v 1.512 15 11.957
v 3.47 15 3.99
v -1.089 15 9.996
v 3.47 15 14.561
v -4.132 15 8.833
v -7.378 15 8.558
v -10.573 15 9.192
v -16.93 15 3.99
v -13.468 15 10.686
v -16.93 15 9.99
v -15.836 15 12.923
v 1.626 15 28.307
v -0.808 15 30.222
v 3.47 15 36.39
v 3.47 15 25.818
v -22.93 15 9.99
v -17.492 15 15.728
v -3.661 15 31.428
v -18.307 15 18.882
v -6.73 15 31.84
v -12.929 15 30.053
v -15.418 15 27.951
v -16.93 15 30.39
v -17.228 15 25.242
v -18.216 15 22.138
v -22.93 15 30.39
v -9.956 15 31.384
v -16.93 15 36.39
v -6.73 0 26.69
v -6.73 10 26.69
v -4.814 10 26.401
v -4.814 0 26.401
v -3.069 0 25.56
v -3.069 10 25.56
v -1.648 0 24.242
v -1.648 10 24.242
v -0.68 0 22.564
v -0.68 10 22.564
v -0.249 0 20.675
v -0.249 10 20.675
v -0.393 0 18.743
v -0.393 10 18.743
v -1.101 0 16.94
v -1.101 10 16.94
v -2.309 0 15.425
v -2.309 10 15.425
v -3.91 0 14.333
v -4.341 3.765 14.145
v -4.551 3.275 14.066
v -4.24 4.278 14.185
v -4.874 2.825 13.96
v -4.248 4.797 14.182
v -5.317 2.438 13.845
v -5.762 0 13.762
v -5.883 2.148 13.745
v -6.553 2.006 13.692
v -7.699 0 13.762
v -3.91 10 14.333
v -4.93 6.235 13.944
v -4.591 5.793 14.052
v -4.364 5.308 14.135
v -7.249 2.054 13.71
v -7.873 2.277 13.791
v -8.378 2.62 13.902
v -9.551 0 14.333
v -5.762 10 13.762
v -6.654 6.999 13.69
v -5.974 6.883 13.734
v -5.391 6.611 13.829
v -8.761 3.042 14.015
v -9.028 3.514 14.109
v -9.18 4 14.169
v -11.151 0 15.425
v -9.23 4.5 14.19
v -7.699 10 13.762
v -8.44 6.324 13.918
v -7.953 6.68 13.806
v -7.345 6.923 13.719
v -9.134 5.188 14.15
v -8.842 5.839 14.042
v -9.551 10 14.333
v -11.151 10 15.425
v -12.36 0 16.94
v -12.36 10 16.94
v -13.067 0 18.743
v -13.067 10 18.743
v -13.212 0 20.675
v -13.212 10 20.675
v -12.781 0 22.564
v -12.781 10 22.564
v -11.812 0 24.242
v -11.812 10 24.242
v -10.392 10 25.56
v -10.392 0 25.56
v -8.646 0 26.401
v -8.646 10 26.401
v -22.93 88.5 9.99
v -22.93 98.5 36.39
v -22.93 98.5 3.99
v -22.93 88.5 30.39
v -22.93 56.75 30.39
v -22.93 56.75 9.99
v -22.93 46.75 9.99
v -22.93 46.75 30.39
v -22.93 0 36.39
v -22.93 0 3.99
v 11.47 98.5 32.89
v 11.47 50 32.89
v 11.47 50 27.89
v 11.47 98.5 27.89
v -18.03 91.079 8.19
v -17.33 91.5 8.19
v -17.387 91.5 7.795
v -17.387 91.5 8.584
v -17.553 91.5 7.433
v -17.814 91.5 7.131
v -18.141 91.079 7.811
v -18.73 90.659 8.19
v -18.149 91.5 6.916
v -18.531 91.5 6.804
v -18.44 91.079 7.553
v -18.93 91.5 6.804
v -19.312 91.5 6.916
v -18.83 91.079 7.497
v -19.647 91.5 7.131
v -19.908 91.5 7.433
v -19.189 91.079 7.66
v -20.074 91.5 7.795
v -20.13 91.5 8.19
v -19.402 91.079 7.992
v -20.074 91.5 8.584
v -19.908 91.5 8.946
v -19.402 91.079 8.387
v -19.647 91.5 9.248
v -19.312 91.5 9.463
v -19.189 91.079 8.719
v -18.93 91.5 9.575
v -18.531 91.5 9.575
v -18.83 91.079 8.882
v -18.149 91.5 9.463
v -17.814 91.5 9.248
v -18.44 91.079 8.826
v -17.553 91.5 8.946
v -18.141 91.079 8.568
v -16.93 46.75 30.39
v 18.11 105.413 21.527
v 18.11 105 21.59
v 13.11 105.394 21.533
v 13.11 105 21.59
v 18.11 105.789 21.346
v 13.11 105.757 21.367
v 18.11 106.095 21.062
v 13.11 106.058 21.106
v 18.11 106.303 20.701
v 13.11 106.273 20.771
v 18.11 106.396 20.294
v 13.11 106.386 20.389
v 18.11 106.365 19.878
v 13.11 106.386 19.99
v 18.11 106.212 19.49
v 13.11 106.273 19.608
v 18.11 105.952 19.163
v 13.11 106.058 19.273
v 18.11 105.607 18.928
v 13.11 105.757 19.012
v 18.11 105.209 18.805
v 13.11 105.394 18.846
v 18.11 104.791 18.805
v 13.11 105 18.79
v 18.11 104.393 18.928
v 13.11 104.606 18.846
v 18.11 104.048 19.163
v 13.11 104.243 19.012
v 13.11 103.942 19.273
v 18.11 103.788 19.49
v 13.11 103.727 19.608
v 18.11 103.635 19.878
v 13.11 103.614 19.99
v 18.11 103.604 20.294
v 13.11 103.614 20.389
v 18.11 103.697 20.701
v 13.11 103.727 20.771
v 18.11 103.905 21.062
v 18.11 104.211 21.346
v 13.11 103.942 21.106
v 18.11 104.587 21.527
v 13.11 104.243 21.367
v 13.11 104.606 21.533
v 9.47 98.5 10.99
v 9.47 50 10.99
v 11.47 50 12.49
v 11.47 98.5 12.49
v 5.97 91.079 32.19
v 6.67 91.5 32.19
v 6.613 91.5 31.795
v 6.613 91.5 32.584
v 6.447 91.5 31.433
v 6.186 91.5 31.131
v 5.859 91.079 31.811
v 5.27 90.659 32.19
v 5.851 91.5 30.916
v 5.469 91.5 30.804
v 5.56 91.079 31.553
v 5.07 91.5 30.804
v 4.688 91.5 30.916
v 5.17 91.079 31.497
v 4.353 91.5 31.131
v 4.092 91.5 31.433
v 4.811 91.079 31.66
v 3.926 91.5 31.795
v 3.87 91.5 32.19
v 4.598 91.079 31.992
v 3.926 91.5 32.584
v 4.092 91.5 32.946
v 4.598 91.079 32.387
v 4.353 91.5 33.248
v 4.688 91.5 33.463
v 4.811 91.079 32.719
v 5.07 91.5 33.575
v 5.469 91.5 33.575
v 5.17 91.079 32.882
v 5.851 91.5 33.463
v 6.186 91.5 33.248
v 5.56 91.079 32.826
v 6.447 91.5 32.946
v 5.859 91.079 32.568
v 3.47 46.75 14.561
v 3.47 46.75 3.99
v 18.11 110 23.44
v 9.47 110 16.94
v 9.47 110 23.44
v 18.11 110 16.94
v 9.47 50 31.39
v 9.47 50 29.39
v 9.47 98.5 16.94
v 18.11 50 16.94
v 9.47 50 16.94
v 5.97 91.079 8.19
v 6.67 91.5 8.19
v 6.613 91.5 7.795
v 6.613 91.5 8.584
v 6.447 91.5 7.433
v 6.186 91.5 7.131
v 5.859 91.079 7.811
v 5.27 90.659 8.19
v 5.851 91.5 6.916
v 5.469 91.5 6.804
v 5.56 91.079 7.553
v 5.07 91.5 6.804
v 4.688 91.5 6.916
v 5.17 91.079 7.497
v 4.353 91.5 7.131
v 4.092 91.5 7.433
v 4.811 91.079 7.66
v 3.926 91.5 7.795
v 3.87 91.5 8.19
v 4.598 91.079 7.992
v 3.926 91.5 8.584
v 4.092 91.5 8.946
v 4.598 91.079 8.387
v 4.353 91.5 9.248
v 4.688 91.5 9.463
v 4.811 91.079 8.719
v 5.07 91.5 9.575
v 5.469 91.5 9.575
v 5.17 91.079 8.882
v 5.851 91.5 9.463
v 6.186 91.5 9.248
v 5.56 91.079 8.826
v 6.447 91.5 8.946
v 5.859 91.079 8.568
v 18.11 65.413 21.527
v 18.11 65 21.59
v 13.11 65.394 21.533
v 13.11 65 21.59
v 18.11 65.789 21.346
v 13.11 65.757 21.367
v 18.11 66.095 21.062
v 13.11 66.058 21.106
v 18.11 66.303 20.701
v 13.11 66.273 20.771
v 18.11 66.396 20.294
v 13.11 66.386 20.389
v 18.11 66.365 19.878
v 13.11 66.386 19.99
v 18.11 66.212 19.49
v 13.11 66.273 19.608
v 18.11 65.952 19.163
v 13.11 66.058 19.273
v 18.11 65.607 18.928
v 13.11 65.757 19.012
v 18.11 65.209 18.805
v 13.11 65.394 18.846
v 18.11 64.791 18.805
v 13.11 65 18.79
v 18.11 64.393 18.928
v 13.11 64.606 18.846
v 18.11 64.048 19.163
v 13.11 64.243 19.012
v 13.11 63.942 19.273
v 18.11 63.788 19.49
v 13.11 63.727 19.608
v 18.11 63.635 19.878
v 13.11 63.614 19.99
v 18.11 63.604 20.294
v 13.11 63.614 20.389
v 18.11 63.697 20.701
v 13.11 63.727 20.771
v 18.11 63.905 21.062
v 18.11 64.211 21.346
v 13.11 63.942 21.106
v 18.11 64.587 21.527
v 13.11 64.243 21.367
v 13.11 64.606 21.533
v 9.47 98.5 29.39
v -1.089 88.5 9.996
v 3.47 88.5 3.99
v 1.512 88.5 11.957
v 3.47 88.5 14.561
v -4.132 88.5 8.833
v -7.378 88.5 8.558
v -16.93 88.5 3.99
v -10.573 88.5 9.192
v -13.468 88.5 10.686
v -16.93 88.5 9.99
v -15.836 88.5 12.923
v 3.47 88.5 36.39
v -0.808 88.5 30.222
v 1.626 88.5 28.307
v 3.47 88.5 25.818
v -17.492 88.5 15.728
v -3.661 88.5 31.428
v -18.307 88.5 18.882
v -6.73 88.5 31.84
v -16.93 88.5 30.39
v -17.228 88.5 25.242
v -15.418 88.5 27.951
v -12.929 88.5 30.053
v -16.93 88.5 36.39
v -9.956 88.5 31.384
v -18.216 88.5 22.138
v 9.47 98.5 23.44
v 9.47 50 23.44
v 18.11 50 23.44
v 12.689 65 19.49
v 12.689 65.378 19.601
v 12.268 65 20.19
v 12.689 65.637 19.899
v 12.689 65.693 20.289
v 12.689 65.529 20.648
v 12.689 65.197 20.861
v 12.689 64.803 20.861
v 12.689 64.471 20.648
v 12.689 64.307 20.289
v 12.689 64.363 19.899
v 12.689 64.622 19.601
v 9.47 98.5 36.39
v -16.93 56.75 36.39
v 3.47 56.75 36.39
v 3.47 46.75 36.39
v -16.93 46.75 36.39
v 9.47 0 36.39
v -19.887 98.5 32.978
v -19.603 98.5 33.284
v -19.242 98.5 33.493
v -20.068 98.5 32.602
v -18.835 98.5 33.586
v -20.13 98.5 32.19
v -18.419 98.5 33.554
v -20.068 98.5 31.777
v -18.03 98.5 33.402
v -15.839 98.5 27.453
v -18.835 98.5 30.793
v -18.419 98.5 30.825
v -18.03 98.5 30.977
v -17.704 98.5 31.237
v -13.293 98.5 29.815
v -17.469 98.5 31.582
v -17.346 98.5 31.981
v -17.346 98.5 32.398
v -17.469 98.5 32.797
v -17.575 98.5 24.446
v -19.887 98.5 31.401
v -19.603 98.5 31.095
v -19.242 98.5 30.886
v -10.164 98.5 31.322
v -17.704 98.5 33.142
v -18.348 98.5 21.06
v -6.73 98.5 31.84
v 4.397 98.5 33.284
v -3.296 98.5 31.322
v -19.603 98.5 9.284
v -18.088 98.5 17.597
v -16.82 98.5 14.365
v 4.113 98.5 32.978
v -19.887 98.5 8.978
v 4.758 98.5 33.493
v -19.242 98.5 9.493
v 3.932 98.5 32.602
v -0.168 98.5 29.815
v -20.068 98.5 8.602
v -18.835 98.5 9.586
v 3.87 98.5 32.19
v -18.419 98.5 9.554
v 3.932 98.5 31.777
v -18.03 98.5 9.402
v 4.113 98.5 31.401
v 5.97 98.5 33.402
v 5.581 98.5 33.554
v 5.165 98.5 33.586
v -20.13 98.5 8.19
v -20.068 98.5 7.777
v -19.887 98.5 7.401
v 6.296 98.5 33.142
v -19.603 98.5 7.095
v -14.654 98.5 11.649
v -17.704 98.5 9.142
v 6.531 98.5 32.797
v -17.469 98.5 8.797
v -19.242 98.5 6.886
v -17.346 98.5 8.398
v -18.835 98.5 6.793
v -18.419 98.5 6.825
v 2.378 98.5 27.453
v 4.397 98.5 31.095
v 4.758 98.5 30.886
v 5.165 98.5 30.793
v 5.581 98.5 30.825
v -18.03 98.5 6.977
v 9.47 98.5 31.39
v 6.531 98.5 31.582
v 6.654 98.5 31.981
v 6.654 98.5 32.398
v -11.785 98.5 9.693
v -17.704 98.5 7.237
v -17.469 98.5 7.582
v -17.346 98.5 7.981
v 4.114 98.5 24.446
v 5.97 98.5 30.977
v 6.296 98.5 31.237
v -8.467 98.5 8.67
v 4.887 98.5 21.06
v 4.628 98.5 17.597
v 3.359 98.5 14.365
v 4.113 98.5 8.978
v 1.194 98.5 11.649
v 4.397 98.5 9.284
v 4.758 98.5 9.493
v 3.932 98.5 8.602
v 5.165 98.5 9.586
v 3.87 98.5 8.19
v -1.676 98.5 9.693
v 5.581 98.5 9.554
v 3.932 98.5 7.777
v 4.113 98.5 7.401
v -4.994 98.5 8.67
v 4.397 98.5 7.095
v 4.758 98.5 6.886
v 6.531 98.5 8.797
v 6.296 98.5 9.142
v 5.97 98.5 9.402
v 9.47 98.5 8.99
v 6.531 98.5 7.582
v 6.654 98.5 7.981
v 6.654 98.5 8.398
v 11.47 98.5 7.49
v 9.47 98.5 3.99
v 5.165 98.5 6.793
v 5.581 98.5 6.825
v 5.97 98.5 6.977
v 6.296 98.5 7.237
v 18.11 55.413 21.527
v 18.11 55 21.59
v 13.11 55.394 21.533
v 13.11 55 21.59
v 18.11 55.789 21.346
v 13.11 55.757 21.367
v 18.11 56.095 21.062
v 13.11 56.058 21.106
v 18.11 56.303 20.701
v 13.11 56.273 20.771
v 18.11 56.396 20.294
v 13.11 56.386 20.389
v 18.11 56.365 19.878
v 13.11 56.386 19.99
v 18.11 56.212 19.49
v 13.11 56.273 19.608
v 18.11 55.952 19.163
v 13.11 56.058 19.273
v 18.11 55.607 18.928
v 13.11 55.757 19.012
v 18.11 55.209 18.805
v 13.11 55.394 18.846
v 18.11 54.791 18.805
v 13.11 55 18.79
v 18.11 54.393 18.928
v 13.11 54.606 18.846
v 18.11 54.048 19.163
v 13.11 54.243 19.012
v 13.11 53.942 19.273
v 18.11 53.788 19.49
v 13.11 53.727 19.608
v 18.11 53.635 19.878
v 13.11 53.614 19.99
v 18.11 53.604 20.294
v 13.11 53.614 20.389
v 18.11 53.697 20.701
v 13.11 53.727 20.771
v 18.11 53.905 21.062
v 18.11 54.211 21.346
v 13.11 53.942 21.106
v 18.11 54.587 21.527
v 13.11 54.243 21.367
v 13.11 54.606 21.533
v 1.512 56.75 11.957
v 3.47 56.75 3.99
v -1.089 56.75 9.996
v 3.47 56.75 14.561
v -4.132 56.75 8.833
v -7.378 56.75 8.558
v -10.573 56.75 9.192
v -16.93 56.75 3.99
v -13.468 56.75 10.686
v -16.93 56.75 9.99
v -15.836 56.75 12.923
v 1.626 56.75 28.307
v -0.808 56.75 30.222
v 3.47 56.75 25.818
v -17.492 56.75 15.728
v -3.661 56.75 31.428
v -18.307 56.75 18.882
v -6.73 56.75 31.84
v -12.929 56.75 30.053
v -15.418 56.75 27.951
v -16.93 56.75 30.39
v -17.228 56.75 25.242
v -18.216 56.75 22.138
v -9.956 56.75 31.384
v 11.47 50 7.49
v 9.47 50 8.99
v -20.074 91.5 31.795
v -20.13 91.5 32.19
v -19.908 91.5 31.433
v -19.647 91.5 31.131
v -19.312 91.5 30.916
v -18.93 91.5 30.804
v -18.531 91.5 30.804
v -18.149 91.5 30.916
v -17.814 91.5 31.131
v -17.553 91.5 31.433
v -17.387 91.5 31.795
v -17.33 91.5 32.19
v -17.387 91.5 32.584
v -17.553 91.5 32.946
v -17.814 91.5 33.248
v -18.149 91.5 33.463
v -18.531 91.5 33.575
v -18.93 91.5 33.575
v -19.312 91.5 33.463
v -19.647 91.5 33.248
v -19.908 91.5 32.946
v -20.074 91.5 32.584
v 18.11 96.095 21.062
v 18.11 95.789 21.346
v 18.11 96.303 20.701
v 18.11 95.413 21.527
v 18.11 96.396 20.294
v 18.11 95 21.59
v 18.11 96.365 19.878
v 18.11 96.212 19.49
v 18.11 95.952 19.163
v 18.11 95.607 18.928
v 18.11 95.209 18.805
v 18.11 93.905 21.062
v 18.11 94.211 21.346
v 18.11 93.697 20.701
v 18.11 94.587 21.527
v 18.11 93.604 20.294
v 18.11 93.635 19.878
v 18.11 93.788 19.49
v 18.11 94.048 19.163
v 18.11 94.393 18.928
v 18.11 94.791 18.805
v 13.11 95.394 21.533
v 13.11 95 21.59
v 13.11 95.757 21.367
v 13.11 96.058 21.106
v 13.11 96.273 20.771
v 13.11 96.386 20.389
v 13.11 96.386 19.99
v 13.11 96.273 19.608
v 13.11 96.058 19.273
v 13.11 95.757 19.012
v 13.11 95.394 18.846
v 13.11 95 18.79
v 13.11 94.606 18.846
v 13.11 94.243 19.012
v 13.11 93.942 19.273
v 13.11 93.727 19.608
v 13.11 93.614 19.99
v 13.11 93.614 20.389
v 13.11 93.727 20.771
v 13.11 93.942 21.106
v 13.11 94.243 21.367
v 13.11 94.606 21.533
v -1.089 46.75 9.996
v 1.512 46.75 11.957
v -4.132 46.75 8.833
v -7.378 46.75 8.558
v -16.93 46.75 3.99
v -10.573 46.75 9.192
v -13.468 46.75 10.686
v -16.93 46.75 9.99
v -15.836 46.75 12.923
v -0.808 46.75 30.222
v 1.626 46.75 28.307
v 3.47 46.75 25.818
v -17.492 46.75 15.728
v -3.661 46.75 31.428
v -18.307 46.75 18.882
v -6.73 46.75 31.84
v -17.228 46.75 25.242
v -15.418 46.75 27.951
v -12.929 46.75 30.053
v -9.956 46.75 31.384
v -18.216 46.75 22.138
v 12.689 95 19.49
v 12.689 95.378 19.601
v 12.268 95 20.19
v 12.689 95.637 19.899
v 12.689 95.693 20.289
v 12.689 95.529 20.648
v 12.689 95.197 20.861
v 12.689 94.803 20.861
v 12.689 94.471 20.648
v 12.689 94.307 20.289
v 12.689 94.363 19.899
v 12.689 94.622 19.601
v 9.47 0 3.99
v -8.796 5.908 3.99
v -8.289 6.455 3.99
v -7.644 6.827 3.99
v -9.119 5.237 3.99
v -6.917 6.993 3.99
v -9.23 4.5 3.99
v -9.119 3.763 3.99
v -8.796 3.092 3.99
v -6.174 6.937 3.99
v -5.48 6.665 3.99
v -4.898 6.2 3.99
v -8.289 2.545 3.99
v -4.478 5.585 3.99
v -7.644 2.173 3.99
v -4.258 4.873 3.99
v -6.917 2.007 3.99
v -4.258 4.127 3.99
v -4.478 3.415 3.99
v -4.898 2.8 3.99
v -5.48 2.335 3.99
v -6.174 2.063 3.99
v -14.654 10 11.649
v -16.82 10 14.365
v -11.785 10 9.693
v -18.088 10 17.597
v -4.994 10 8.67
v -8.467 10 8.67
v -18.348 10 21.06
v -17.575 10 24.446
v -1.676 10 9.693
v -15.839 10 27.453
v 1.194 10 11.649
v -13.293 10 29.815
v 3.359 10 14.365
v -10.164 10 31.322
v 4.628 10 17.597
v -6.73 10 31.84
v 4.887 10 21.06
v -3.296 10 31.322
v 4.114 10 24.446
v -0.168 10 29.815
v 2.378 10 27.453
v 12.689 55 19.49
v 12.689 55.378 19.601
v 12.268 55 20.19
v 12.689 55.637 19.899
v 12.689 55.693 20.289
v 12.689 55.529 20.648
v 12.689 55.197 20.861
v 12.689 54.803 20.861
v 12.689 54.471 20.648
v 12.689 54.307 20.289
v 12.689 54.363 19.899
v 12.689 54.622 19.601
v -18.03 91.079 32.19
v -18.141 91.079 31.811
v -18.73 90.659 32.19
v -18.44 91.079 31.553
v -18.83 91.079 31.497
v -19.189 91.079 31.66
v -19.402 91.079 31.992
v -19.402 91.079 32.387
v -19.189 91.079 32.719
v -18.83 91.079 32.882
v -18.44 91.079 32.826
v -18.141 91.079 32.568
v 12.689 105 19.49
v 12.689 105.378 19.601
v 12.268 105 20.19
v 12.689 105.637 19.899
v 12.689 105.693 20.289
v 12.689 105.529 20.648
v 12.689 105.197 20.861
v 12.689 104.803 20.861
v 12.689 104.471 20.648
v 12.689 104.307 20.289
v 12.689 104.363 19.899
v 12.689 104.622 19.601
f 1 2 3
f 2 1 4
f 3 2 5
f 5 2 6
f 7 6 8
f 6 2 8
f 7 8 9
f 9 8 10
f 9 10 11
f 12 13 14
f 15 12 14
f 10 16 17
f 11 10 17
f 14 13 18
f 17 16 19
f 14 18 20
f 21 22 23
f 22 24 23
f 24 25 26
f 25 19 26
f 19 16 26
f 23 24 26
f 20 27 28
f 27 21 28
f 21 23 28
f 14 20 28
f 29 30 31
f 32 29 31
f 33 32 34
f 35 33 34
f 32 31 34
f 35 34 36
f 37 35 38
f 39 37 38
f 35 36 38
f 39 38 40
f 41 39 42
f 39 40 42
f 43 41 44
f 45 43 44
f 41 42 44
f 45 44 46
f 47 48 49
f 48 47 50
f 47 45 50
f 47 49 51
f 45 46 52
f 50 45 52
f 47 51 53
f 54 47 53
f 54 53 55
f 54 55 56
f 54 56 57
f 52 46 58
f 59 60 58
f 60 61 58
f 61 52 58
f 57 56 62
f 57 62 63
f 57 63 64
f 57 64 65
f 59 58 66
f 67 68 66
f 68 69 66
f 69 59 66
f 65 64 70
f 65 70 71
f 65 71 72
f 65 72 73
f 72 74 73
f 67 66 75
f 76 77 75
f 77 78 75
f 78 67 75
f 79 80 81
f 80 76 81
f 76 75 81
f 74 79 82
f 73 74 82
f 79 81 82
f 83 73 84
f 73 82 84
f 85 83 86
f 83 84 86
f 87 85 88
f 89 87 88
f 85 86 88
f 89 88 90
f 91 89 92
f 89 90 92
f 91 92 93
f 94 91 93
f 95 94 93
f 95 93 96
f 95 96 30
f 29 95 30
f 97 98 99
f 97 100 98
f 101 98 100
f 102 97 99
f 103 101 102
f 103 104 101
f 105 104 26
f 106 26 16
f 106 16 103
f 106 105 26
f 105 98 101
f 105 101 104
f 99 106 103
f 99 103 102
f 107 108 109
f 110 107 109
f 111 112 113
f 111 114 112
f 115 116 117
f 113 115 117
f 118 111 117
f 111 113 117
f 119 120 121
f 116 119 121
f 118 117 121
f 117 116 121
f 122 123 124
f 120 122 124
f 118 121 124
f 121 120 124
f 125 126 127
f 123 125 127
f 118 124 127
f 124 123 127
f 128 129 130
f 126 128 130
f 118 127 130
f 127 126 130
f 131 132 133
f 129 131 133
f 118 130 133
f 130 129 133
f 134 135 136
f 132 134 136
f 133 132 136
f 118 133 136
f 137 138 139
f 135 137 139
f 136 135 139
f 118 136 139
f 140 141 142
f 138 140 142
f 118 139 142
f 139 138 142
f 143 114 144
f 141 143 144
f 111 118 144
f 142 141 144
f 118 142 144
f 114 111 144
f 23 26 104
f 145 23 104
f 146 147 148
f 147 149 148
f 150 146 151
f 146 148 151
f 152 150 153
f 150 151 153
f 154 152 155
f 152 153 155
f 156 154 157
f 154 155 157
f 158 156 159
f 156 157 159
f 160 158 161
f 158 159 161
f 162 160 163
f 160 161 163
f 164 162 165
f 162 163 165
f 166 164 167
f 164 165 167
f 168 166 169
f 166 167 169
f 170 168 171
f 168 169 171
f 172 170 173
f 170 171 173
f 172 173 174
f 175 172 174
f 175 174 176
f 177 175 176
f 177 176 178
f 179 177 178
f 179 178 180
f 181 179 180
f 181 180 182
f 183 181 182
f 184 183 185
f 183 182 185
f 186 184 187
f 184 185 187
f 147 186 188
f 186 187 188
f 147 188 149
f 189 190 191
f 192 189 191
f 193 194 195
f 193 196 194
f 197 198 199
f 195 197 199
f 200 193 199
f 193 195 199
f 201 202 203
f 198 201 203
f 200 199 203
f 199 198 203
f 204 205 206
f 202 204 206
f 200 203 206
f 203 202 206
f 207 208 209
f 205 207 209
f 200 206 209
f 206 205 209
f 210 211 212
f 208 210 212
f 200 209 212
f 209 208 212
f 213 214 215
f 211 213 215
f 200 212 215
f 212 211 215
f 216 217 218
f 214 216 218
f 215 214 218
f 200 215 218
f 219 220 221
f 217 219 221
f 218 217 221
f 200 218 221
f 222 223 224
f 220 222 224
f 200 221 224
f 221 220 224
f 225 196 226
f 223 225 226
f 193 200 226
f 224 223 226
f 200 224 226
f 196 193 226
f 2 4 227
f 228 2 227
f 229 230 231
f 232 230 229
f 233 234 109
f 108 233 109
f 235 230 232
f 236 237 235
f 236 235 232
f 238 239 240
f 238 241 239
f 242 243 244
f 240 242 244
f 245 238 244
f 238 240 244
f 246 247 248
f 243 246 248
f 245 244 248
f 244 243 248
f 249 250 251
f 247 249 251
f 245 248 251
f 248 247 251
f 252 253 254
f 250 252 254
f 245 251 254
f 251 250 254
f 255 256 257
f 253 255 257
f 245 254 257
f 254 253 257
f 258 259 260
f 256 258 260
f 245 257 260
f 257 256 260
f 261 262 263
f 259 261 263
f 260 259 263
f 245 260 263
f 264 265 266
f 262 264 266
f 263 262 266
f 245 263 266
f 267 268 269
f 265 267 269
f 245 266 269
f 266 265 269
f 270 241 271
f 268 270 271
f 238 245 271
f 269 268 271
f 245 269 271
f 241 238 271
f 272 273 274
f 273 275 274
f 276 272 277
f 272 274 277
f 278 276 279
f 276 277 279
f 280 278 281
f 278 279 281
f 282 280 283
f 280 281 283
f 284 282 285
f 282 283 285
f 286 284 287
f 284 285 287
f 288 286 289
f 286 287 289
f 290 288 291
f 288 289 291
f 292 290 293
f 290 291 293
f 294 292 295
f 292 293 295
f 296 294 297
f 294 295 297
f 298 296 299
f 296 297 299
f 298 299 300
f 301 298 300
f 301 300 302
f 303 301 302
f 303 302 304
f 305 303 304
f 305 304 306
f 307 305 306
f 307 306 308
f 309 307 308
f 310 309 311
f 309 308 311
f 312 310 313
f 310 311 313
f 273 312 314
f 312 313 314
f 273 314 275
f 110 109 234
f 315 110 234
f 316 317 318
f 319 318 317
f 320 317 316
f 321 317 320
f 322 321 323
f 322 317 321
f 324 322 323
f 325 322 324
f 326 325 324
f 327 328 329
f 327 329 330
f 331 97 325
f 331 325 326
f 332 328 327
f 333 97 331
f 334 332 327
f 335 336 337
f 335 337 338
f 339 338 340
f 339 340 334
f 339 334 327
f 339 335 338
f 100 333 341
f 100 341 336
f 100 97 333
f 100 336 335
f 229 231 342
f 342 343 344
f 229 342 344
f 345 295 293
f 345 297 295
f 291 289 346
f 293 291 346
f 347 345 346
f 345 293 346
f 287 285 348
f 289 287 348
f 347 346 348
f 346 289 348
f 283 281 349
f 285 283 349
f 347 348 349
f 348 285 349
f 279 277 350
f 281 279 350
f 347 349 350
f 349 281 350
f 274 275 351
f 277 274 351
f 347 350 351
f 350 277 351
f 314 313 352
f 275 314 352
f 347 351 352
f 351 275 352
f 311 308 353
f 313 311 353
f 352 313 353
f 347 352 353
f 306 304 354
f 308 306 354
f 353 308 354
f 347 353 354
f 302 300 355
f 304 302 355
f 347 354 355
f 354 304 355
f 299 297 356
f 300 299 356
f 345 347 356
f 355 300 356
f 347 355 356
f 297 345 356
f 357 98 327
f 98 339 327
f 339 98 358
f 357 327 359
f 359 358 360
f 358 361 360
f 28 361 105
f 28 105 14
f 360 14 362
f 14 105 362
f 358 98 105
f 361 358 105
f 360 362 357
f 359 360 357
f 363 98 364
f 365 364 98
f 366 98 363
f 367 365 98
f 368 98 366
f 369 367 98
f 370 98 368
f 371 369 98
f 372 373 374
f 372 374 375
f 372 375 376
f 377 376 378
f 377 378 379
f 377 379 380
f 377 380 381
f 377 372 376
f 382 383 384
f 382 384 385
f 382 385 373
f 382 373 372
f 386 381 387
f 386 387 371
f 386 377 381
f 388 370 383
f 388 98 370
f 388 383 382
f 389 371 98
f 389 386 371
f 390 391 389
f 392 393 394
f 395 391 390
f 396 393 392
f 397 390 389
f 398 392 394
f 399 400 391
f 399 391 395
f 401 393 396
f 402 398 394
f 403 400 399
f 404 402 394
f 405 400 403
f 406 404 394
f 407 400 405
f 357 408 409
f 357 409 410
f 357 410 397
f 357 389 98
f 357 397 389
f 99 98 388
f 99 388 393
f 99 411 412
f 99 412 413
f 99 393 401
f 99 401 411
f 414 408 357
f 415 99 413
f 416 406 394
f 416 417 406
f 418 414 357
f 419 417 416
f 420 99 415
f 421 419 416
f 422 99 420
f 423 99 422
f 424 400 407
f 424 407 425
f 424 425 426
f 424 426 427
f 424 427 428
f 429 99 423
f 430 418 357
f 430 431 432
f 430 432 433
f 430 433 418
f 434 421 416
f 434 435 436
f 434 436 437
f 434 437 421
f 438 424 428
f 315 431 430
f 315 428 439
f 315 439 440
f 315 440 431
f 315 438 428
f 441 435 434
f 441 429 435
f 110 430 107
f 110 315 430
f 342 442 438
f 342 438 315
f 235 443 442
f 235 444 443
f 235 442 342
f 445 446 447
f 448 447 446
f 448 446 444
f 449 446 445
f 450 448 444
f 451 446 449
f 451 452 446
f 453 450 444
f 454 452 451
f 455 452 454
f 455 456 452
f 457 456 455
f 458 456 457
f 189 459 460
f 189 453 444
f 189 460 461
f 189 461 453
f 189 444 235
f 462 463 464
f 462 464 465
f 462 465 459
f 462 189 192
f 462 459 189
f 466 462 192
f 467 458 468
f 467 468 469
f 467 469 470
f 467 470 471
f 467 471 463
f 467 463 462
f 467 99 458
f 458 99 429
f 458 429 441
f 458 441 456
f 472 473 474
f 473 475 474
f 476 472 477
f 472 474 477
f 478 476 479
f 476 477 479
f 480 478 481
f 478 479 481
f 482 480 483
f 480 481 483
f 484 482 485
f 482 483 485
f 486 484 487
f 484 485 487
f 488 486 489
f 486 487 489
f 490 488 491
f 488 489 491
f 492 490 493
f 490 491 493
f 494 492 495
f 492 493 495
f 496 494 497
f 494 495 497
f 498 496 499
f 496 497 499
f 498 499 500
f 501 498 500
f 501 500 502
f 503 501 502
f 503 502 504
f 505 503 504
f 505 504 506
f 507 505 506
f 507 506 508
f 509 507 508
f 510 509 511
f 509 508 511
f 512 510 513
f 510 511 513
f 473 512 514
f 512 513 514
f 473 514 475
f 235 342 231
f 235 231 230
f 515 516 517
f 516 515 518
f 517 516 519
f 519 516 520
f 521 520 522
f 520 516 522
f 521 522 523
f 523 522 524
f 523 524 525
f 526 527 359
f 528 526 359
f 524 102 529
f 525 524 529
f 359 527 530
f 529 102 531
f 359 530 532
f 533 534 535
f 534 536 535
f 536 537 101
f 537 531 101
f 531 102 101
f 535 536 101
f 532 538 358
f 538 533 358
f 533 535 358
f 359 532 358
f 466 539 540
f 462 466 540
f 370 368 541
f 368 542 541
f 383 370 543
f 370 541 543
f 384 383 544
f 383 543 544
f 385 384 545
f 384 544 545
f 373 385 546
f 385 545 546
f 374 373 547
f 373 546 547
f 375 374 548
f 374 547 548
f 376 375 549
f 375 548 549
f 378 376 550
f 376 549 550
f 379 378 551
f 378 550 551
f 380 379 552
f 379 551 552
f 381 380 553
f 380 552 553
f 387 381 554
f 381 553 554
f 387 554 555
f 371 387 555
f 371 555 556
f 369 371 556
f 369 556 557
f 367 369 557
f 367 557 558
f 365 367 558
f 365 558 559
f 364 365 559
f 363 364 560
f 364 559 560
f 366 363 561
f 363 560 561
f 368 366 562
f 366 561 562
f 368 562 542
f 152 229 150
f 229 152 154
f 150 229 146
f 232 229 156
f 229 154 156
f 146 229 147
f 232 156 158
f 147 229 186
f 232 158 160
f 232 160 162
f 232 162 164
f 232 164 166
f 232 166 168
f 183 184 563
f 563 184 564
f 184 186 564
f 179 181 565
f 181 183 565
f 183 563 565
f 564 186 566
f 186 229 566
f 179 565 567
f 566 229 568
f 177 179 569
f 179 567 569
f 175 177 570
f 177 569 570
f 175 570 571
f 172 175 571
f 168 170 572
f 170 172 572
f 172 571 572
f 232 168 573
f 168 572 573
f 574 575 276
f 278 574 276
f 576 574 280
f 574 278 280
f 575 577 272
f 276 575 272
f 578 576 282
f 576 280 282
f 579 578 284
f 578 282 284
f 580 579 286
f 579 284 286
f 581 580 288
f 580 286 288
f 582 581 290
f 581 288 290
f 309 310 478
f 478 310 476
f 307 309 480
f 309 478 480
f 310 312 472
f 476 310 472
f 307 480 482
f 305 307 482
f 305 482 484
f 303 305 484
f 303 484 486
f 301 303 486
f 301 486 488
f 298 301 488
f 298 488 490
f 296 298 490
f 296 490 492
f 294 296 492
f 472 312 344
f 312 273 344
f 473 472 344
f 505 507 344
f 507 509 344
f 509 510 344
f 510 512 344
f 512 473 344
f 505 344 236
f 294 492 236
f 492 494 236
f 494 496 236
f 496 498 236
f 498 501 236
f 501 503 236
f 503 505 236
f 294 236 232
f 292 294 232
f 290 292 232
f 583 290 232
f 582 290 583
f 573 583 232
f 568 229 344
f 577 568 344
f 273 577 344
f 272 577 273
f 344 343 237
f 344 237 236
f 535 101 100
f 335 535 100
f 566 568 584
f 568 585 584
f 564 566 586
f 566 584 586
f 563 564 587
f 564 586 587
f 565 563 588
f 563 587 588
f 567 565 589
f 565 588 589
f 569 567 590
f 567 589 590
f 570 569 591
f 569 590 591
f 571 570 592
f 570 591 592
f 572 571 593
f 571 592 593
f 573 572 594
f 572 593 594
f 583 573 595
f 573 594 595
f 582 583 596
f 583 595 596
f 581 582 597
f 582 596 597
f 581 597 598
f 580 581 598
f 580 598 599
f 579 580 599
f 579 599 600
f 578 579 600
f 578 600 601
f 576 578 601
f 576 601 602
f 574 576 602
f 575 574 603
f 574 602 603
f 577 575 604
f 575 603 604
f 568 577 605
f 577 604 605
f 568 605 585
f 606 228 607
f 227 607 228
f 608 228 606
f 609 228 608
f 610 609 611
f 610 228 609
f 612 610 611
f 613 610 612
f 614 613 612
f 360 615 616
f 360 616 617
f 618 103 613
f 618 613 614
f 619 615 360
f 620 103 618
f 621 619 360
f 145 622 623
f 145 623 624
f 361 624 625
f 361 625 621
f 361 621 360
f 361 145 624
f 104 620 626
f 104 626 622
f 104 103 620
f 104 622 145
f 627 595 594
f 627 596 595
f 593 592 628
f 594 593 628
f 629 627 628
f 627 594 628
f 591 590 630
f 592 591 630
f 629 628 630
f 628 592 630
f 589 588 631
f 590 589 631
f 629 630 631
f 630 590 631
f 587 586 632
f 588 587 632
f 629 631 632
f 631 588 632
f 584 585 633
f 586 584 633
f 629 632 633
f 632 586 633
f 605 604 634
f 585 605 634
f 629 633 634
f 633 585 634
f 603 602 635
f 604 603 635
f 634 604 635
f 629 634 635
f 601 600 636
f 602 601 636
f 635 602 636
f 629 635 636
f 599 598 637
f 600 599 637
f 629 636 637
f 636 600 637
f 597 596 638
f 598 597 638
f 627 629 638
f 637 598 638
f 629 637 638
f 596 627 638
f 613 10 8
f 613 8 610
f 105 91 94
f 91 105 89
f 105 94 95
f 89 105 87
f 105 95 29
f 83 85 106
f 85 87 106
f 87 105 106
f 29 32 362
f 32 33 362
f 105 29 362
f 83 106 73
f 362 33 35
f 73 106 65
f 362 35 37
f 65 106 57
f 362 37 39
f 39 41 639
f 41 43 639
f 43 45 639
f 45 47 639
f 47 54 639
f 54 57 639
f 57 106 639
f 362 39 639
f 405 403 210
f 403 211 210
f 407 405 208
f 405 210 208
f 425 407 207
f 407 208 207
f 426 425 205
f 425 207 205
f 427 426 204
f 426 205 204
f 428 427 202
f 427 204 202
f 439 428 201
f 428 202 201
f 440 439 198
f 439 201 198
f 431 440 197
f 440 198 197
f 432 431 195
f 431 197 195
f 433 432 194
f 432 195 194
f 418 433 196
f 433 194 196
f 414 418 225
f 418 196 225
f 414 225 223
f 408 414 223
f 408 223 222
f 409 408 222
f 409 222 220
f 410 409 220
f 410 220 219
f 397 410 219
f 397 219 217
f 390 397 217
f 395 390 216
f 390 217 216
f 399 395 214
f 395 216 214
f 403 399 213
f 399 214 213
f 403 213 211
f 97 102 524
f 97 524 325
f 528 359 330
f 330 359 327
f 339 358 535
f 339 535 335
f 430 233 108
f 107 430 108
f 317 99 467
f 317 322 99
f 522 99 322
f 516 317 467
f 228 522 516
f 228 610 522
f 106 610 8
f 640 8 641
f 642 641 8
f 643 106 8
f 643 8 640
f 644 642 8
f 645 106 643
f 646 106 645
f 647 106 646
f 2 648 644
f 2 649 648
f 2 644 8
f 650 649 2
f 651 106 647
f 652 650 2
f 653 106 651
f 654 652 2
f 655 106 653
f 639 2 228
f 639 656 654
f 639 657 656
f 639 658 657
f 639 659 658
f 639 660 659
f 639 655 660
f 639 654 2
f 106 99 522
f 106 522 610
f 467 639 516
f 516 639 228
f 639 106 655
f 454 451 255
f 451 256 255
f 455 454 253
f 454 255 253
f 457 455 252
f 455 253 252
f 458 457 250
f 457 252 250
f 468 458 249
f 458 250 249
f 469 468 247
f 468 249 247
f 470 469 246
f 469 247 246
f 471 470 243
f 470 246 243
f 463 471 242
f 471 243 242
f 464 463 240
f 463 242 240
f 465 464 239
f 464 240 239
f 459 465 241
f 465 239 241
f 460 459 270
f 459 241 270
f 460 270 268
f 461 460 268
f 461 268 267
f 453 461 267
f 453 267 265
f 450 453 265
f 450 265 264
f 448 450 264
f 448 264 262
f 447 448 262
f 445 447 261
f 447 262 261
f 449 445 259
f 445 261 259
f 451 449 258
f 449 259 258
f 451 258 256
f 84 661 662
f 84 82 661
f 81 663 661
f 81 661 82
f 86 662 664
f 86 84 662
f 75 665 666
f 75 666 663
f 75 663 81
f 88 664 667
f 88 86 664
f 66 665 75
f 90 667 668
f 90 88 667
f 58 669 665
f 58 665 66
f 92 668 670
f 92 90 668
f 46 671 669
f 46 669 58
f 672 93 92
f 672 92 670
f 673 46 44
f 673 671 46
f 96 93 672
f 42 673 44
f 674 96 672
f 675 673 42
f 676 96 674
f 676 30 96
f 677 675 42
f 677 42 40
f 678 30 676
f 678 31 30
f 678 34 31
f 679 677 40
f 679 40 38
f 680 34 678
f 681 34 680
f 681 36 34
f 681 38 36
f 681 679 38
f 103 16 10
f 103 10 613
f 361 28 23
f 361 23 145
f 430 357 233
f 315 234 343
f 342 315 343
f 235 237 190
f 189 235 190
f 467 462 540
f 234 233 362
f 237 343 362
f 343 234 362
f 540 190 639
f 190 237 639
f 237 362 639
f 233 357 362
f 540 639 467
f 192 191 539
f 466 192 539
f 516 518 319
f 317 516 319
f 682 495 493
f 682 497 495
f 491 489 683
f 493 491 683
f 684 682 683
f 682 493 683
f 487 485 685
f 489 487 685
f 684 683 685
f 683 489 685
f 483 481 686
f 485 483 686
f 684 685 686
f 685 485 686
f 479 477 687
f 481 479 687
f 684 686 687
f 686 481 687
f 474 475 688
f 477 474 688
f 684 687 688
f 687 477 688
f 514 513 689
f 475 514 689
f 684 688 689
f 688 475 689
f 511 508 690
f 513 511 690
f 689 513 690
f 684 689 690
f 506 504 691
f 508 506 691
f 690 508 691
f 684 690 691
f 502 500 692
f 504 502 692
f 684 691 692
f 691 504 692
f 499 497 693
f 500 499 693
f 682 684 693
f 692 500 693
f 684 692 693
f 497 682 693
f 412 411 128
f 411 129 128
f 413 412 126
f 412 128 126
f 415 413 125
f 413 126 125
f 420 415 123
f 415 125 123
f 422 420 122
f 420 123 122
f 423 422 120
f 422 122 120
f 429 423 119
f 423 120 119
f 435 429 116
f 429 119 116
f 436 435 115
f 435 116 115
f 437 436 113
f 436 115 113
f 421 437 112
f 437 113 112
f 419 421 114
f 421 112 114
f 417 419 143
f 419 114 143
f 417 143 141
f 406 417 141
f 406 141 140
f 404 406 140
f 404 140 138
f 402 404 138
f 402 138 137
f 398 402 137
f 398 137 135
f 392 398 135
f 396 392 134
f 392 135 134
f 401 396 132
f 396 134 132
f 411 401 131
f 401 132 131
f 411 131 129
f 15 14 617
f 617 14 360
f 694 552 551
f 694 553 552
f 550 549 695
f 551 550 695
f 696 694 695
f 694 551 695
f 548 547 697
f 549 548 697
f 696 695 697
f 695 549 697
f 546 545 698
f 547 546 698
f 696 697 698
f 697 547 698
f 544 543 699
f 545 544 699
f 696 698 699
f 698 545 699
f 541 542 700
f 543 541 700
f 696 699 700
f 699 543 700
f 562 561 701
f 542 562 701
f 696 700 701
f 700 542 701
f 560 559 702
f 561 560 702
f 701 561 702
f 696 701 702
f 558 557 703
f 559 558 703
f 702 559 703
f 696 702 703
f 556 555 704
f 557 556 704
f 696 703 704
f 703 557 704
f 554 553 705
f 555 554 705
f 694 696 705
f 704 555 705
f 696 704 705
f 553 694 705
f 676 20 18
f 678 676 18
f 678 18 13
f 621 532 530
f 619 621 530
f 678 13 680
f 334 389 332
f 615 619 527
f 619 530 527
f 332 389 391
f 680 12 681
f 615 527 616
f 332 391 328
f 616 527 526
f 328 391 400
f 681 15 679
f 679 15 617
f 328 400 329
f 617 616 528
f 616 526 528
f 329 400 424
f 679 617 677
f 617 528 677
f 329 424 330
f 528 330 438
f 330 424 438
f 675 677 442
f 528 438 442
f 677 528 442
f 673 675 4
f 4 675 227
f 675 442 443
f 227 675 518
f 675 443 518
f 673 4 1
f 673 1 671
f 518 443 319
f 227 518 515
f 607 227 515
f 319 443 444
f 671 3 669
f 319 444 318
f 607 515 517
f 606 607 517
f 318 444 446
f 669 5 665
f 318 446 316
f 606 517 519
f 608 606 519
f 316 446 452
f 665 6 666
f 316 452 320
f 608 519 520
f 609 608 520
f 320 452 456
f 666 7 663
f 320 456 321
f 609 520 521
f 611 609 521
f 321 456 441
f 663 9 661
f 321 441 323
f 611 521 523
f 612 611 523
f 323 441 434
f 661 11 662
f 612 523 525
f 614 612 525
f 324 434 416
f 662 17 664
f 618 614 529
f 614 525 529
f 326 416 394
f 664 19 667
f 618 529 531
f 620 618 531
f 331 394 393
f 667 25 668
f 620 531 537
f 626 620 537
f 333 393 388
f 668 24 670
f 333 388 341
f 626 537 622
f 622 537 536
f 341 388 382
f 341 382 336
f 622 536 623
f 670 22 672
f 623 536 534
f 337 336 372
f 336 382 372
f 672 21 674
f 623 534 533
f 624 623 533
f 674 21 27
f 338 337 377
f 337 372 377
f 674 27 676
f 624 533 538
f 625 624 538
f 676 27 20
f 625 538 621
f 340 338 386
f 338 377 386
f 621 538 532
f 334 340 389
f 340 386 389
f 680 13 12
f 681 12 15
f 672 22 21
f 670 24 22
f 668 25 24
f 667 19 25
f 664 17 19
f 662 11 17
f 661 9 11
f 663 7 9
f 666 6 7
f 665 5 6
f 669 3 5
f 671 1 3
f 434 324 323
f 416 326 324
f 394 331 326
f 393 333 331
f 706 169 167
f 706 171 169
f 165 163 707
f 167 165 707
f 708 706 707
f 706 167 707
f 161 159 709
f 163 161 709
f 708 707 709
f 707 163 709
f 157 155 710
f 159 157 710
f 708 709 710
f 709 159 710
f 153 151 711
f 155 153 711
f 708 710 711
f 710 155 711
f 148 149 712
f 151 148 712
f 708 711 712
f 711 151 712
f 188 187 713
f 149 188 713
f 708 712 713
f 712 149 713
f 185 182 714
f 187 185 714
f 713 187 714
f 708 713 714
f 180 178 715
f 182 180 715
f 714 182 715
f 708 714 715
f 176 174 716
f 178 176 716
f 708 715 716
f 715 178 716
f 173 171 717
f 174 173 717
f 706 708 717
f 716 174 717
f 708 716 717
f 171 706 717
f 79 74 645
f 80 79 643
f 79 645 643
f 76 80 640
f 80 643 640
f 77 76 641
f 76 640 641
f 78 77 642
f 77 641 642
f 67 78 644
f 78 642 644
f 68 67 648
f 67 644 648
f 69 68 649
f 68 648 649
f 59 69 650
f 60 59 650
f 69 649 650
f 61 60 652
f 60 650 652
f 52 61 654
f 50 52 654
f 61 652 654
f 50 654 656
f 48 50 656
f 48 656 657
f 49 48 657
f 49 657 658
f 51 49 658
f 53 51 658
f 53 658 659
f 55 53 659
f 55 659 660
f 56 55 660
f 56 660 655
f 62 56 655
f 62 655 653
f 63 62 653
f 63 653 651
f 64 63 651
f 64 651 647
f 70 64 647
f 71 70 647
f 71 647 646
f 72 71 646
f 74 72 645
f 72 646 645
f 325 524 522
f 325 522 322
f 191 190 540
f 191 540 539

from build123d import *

# Parameters (mm, degrees)
SKETCH1_W                 = 32.4
SKETCH1_H                 = 32.4
BOSS_EXTRUDE1_DEPTH       = 98.5
SKETCH2_R                 = 11.65
CUT_EXTRUDE1_DEPTH        = 88.5
SKETCH3_R                 = 6.5
CUT_EXTRUDE2_DEPTH        = 99.398410022
F_1_0MM_DOWEL_HOLE1_D     = 2.8
F_1_0MM_DOWEL_HOLE1_DEPTH = 7
F_1_0MM_DOWEL_HOLE1_TIP   = 0.841204867
SKETCH7_R                 = 2.5
CUT_EXTRUDE3_DEPTH        = 14
SKETCH8_W                 = 6.5
SKETCH8_H                 = 98.5
BOSS_EXTRUDE2_DEPTH       = 8.64
SKETCH14_W                = 30.956114244
SKETCH14_H                = 32.4
CUT_EXTRUDE6_DEPTH        = 50
SKETCH11_W                = 20.4
SKETCH11_H                = 31.75
CUT_EXTRUDE4_DEPTH        = 107.197037106
SKETCH12_W                = 20.4
SKETCH12_H                = 31.75
CUT_EXTRUDE5_DEPTH        = 15
SKETCH23_W                = 8.64
SKETCH23_H                = 6.5
BOSS_EXTRUDE3_DEPTH       = 11.5
F_1_0MM_DOWEL_HOLE3_D     = 2.8
F_1_0MM_DOWEL_HOLE3_DEPTH = 5
F_1_0MM_DOWEL_HOLE3_TIP   = 0.841204867


with BuildPart() as part:
    # Sketch1 → Boss-Extrude1 (new body)
    with BuildSketch(Plane(origin=(0, 0, 0), x_dir=(1, 0, 0), z_dir=(0, 1, 0))):
        with Locations((-6.730344165, -20.189509634)):
            Rectangle(SKETCH1_W, SKETCH1_H)
        Polygon((11.469655835, -27.889509634), (9.469655835, -29.389509634), (9.469655835, -31.389509634), (11.469655835, -32.889509634), align=None)
        Polygon((11.469655835, -7.489509634), (9.469655835, -8.989509634), (9.469655835, -10.989509634), (11.469655835, -12.489509634), align=None)
    extrude(amount=BOSS_EXTRUDE1_DEPTH)

    # Sketch2 → Cut-Extrude1 (cut)
    with BuildSketch(Plane(origin=(0, 98.5, 0), x_dir=(1, 0, 0), z_dir=(0, 1, 0))):
        with Locations(Location((-6.730344165, -20.189509634, 0), (0, 0, 270))):
            Circle(SKETCH2_R)
    extrude(amount=-CUT_EXTRUDE1_DEPTH, mode=Mode.SUBTRACT)

    # Sketch3 → Cut-Extrude2 (cut, through all)
    with BuildSketch(Plane(origin=(0, 10, 0), x_dir=(1, 0, 0), z_dir=(0, 1, 0))):
        with Locations(Location((-6.730344165, -20.189509634, 0), (0, 0, 270))):
            Circle(SKETCH3_R)
    extrude(amount=-CUT_EXTRUDE2_DEPTH, mode=Mode.SUBTRACT)

    # Ø1.0mm Dowel Hole1
    with Locations(Plane(origin=(0, 98.5, 0), x_dir=(1, 0, 0), z_dir=(0, 1, 0))):
        with Locations((-18.730344165, -8.189509634), (5.269655835, -8.189509634), (5.269655835, -32.189509634), (-18.730344165, -32.189509634)):
            Hole(F_1_0MM_DOWEL_HOLE1_D / 2, depth=F_1_0MM_DOWEL_HOLE1_DEPTH)
            with Locations((0, 0, -(F_1_0MM_DOWEL_HOLE1_DEPTH + F_1_0MM_DOWEL_HOLE1_TIP / 2))):  # 118° drill point
                Cone(0, F_1_0MM_DOWEL_HOLE1_D / 2, F_1_0MM_DOWEL_HOLE1_TIP, mode=Mode.SUBTRACT)

    # Sketch7 → Cut-Extrude3 (cut)
    with BuildSketch(Plane(origin=(0, 0, 3.989509634), x_dir=(-1, 0, 0), z_dir=(0, 0, -1))):
        with Locations((6.730344165, 4.5)):
            Circle(SKETCH7_R)
    extrude(amount=-CUT_EXTRUDE3_DEPTH, mode=Mode.SUBTRACT)

    # Sketch8 → Boss-Extrude2 (add)
    with BuildSketch(Plane(origin=(9.469655835, 0, 0), x_dir=(0, 0, -1), z_dir=(1, 0, 0))):
        with Locations((-20.189509634, 49.25)):
            Rectangle(SKETCH8_W, SKETCH8_H)
    extrude(amount=BOSS_EXTRUDE2_DEPTH)

    # Sketch14 → Cut-Extrude6 (cut)
    with BuildSketch(Plane.XZ):
        with Locations((24.947712957, 20.189509634)):
            Rectangle(SKETCH14_W, SKETCH14_H)
    extrude(amount=-CUT_EXTRUDE6_DEPTH, mode=Mode.SUBTRACT)

    # Sketch11 → Cut-Extrude4 (cut, through all)
    with BuildSketch(Plane.XY.offset(36.389509634)):
        with Locations((-6.730344165, 72.625)):
            Rectangle(SKETCH11_W, SKETCH11_H)
        with Locations((-6.730344165, 30.875)):
            Rectangle(SKETCH11_W, SKETCH11_H)
    extrude(amount=-CUT_EXTRUDE4_DEPTH, mode=Mode.SUBTRACT)

    # Sketch12 → Cut-Extrude5 (cut)
    with BuildSketch(Plane.ZY.offset(22.930344165)):
        with Locations((20.189509634, 72.625)):
            Rectangle(SKETCH12_W, SKETCH12_H)
        with Locations((20.189509634, 30.875)):
            Rectangle(SKETCH12_W, SKETCH12_H)
    extrude(amount=-CUT_EXTRUDE5_DEPTH, mode=Mode.SUBTRACT)

    # Sketch23 → Boss-Extrude3 (add)
    with BuildSketch(Plane(origin=(0, 98.5, 0), x_dir=(1, 0, 0), z_dir=(0, 1, 0))):
        with Locations((13.789655835, -20.189509634)):
            Rectangle(SKETCH23_W, SKETCH23_H)
    extrude(amount=BOSS_EXTRUDE3_DEPTH)

    # Ø1.0mm Dowel Hole3
    with Locations(Plane(origin=(18.109655835, 0, 0), x_dir=(0, 0, -1), z_dir=(1, 0, 0))):
        with Locations((-20.189509634, 105), (-20.189509634, 55), (-20.189509634, 65), (-20.189509634, 95)):
            Hole(F_1_0MM_DOWEL_HOLE3_D / 2, depth=F_1_0MM_DOWEL_HOLE3_DEPTH)
            with Locations((0, 0, -(F_1_0MM_DOWEL_HOLE3_DEPTH + F_1_0MM_DOWEL_HOLE3_TIP / 2))):  # 118° drill point
                Cone(0, F_1_0MM_DOWEL_HOLE3_D / 2, F_1_0MM_DOWEL_HOLE3_TIP, mode=Mode.SUBTRACT)


solid = part.part
